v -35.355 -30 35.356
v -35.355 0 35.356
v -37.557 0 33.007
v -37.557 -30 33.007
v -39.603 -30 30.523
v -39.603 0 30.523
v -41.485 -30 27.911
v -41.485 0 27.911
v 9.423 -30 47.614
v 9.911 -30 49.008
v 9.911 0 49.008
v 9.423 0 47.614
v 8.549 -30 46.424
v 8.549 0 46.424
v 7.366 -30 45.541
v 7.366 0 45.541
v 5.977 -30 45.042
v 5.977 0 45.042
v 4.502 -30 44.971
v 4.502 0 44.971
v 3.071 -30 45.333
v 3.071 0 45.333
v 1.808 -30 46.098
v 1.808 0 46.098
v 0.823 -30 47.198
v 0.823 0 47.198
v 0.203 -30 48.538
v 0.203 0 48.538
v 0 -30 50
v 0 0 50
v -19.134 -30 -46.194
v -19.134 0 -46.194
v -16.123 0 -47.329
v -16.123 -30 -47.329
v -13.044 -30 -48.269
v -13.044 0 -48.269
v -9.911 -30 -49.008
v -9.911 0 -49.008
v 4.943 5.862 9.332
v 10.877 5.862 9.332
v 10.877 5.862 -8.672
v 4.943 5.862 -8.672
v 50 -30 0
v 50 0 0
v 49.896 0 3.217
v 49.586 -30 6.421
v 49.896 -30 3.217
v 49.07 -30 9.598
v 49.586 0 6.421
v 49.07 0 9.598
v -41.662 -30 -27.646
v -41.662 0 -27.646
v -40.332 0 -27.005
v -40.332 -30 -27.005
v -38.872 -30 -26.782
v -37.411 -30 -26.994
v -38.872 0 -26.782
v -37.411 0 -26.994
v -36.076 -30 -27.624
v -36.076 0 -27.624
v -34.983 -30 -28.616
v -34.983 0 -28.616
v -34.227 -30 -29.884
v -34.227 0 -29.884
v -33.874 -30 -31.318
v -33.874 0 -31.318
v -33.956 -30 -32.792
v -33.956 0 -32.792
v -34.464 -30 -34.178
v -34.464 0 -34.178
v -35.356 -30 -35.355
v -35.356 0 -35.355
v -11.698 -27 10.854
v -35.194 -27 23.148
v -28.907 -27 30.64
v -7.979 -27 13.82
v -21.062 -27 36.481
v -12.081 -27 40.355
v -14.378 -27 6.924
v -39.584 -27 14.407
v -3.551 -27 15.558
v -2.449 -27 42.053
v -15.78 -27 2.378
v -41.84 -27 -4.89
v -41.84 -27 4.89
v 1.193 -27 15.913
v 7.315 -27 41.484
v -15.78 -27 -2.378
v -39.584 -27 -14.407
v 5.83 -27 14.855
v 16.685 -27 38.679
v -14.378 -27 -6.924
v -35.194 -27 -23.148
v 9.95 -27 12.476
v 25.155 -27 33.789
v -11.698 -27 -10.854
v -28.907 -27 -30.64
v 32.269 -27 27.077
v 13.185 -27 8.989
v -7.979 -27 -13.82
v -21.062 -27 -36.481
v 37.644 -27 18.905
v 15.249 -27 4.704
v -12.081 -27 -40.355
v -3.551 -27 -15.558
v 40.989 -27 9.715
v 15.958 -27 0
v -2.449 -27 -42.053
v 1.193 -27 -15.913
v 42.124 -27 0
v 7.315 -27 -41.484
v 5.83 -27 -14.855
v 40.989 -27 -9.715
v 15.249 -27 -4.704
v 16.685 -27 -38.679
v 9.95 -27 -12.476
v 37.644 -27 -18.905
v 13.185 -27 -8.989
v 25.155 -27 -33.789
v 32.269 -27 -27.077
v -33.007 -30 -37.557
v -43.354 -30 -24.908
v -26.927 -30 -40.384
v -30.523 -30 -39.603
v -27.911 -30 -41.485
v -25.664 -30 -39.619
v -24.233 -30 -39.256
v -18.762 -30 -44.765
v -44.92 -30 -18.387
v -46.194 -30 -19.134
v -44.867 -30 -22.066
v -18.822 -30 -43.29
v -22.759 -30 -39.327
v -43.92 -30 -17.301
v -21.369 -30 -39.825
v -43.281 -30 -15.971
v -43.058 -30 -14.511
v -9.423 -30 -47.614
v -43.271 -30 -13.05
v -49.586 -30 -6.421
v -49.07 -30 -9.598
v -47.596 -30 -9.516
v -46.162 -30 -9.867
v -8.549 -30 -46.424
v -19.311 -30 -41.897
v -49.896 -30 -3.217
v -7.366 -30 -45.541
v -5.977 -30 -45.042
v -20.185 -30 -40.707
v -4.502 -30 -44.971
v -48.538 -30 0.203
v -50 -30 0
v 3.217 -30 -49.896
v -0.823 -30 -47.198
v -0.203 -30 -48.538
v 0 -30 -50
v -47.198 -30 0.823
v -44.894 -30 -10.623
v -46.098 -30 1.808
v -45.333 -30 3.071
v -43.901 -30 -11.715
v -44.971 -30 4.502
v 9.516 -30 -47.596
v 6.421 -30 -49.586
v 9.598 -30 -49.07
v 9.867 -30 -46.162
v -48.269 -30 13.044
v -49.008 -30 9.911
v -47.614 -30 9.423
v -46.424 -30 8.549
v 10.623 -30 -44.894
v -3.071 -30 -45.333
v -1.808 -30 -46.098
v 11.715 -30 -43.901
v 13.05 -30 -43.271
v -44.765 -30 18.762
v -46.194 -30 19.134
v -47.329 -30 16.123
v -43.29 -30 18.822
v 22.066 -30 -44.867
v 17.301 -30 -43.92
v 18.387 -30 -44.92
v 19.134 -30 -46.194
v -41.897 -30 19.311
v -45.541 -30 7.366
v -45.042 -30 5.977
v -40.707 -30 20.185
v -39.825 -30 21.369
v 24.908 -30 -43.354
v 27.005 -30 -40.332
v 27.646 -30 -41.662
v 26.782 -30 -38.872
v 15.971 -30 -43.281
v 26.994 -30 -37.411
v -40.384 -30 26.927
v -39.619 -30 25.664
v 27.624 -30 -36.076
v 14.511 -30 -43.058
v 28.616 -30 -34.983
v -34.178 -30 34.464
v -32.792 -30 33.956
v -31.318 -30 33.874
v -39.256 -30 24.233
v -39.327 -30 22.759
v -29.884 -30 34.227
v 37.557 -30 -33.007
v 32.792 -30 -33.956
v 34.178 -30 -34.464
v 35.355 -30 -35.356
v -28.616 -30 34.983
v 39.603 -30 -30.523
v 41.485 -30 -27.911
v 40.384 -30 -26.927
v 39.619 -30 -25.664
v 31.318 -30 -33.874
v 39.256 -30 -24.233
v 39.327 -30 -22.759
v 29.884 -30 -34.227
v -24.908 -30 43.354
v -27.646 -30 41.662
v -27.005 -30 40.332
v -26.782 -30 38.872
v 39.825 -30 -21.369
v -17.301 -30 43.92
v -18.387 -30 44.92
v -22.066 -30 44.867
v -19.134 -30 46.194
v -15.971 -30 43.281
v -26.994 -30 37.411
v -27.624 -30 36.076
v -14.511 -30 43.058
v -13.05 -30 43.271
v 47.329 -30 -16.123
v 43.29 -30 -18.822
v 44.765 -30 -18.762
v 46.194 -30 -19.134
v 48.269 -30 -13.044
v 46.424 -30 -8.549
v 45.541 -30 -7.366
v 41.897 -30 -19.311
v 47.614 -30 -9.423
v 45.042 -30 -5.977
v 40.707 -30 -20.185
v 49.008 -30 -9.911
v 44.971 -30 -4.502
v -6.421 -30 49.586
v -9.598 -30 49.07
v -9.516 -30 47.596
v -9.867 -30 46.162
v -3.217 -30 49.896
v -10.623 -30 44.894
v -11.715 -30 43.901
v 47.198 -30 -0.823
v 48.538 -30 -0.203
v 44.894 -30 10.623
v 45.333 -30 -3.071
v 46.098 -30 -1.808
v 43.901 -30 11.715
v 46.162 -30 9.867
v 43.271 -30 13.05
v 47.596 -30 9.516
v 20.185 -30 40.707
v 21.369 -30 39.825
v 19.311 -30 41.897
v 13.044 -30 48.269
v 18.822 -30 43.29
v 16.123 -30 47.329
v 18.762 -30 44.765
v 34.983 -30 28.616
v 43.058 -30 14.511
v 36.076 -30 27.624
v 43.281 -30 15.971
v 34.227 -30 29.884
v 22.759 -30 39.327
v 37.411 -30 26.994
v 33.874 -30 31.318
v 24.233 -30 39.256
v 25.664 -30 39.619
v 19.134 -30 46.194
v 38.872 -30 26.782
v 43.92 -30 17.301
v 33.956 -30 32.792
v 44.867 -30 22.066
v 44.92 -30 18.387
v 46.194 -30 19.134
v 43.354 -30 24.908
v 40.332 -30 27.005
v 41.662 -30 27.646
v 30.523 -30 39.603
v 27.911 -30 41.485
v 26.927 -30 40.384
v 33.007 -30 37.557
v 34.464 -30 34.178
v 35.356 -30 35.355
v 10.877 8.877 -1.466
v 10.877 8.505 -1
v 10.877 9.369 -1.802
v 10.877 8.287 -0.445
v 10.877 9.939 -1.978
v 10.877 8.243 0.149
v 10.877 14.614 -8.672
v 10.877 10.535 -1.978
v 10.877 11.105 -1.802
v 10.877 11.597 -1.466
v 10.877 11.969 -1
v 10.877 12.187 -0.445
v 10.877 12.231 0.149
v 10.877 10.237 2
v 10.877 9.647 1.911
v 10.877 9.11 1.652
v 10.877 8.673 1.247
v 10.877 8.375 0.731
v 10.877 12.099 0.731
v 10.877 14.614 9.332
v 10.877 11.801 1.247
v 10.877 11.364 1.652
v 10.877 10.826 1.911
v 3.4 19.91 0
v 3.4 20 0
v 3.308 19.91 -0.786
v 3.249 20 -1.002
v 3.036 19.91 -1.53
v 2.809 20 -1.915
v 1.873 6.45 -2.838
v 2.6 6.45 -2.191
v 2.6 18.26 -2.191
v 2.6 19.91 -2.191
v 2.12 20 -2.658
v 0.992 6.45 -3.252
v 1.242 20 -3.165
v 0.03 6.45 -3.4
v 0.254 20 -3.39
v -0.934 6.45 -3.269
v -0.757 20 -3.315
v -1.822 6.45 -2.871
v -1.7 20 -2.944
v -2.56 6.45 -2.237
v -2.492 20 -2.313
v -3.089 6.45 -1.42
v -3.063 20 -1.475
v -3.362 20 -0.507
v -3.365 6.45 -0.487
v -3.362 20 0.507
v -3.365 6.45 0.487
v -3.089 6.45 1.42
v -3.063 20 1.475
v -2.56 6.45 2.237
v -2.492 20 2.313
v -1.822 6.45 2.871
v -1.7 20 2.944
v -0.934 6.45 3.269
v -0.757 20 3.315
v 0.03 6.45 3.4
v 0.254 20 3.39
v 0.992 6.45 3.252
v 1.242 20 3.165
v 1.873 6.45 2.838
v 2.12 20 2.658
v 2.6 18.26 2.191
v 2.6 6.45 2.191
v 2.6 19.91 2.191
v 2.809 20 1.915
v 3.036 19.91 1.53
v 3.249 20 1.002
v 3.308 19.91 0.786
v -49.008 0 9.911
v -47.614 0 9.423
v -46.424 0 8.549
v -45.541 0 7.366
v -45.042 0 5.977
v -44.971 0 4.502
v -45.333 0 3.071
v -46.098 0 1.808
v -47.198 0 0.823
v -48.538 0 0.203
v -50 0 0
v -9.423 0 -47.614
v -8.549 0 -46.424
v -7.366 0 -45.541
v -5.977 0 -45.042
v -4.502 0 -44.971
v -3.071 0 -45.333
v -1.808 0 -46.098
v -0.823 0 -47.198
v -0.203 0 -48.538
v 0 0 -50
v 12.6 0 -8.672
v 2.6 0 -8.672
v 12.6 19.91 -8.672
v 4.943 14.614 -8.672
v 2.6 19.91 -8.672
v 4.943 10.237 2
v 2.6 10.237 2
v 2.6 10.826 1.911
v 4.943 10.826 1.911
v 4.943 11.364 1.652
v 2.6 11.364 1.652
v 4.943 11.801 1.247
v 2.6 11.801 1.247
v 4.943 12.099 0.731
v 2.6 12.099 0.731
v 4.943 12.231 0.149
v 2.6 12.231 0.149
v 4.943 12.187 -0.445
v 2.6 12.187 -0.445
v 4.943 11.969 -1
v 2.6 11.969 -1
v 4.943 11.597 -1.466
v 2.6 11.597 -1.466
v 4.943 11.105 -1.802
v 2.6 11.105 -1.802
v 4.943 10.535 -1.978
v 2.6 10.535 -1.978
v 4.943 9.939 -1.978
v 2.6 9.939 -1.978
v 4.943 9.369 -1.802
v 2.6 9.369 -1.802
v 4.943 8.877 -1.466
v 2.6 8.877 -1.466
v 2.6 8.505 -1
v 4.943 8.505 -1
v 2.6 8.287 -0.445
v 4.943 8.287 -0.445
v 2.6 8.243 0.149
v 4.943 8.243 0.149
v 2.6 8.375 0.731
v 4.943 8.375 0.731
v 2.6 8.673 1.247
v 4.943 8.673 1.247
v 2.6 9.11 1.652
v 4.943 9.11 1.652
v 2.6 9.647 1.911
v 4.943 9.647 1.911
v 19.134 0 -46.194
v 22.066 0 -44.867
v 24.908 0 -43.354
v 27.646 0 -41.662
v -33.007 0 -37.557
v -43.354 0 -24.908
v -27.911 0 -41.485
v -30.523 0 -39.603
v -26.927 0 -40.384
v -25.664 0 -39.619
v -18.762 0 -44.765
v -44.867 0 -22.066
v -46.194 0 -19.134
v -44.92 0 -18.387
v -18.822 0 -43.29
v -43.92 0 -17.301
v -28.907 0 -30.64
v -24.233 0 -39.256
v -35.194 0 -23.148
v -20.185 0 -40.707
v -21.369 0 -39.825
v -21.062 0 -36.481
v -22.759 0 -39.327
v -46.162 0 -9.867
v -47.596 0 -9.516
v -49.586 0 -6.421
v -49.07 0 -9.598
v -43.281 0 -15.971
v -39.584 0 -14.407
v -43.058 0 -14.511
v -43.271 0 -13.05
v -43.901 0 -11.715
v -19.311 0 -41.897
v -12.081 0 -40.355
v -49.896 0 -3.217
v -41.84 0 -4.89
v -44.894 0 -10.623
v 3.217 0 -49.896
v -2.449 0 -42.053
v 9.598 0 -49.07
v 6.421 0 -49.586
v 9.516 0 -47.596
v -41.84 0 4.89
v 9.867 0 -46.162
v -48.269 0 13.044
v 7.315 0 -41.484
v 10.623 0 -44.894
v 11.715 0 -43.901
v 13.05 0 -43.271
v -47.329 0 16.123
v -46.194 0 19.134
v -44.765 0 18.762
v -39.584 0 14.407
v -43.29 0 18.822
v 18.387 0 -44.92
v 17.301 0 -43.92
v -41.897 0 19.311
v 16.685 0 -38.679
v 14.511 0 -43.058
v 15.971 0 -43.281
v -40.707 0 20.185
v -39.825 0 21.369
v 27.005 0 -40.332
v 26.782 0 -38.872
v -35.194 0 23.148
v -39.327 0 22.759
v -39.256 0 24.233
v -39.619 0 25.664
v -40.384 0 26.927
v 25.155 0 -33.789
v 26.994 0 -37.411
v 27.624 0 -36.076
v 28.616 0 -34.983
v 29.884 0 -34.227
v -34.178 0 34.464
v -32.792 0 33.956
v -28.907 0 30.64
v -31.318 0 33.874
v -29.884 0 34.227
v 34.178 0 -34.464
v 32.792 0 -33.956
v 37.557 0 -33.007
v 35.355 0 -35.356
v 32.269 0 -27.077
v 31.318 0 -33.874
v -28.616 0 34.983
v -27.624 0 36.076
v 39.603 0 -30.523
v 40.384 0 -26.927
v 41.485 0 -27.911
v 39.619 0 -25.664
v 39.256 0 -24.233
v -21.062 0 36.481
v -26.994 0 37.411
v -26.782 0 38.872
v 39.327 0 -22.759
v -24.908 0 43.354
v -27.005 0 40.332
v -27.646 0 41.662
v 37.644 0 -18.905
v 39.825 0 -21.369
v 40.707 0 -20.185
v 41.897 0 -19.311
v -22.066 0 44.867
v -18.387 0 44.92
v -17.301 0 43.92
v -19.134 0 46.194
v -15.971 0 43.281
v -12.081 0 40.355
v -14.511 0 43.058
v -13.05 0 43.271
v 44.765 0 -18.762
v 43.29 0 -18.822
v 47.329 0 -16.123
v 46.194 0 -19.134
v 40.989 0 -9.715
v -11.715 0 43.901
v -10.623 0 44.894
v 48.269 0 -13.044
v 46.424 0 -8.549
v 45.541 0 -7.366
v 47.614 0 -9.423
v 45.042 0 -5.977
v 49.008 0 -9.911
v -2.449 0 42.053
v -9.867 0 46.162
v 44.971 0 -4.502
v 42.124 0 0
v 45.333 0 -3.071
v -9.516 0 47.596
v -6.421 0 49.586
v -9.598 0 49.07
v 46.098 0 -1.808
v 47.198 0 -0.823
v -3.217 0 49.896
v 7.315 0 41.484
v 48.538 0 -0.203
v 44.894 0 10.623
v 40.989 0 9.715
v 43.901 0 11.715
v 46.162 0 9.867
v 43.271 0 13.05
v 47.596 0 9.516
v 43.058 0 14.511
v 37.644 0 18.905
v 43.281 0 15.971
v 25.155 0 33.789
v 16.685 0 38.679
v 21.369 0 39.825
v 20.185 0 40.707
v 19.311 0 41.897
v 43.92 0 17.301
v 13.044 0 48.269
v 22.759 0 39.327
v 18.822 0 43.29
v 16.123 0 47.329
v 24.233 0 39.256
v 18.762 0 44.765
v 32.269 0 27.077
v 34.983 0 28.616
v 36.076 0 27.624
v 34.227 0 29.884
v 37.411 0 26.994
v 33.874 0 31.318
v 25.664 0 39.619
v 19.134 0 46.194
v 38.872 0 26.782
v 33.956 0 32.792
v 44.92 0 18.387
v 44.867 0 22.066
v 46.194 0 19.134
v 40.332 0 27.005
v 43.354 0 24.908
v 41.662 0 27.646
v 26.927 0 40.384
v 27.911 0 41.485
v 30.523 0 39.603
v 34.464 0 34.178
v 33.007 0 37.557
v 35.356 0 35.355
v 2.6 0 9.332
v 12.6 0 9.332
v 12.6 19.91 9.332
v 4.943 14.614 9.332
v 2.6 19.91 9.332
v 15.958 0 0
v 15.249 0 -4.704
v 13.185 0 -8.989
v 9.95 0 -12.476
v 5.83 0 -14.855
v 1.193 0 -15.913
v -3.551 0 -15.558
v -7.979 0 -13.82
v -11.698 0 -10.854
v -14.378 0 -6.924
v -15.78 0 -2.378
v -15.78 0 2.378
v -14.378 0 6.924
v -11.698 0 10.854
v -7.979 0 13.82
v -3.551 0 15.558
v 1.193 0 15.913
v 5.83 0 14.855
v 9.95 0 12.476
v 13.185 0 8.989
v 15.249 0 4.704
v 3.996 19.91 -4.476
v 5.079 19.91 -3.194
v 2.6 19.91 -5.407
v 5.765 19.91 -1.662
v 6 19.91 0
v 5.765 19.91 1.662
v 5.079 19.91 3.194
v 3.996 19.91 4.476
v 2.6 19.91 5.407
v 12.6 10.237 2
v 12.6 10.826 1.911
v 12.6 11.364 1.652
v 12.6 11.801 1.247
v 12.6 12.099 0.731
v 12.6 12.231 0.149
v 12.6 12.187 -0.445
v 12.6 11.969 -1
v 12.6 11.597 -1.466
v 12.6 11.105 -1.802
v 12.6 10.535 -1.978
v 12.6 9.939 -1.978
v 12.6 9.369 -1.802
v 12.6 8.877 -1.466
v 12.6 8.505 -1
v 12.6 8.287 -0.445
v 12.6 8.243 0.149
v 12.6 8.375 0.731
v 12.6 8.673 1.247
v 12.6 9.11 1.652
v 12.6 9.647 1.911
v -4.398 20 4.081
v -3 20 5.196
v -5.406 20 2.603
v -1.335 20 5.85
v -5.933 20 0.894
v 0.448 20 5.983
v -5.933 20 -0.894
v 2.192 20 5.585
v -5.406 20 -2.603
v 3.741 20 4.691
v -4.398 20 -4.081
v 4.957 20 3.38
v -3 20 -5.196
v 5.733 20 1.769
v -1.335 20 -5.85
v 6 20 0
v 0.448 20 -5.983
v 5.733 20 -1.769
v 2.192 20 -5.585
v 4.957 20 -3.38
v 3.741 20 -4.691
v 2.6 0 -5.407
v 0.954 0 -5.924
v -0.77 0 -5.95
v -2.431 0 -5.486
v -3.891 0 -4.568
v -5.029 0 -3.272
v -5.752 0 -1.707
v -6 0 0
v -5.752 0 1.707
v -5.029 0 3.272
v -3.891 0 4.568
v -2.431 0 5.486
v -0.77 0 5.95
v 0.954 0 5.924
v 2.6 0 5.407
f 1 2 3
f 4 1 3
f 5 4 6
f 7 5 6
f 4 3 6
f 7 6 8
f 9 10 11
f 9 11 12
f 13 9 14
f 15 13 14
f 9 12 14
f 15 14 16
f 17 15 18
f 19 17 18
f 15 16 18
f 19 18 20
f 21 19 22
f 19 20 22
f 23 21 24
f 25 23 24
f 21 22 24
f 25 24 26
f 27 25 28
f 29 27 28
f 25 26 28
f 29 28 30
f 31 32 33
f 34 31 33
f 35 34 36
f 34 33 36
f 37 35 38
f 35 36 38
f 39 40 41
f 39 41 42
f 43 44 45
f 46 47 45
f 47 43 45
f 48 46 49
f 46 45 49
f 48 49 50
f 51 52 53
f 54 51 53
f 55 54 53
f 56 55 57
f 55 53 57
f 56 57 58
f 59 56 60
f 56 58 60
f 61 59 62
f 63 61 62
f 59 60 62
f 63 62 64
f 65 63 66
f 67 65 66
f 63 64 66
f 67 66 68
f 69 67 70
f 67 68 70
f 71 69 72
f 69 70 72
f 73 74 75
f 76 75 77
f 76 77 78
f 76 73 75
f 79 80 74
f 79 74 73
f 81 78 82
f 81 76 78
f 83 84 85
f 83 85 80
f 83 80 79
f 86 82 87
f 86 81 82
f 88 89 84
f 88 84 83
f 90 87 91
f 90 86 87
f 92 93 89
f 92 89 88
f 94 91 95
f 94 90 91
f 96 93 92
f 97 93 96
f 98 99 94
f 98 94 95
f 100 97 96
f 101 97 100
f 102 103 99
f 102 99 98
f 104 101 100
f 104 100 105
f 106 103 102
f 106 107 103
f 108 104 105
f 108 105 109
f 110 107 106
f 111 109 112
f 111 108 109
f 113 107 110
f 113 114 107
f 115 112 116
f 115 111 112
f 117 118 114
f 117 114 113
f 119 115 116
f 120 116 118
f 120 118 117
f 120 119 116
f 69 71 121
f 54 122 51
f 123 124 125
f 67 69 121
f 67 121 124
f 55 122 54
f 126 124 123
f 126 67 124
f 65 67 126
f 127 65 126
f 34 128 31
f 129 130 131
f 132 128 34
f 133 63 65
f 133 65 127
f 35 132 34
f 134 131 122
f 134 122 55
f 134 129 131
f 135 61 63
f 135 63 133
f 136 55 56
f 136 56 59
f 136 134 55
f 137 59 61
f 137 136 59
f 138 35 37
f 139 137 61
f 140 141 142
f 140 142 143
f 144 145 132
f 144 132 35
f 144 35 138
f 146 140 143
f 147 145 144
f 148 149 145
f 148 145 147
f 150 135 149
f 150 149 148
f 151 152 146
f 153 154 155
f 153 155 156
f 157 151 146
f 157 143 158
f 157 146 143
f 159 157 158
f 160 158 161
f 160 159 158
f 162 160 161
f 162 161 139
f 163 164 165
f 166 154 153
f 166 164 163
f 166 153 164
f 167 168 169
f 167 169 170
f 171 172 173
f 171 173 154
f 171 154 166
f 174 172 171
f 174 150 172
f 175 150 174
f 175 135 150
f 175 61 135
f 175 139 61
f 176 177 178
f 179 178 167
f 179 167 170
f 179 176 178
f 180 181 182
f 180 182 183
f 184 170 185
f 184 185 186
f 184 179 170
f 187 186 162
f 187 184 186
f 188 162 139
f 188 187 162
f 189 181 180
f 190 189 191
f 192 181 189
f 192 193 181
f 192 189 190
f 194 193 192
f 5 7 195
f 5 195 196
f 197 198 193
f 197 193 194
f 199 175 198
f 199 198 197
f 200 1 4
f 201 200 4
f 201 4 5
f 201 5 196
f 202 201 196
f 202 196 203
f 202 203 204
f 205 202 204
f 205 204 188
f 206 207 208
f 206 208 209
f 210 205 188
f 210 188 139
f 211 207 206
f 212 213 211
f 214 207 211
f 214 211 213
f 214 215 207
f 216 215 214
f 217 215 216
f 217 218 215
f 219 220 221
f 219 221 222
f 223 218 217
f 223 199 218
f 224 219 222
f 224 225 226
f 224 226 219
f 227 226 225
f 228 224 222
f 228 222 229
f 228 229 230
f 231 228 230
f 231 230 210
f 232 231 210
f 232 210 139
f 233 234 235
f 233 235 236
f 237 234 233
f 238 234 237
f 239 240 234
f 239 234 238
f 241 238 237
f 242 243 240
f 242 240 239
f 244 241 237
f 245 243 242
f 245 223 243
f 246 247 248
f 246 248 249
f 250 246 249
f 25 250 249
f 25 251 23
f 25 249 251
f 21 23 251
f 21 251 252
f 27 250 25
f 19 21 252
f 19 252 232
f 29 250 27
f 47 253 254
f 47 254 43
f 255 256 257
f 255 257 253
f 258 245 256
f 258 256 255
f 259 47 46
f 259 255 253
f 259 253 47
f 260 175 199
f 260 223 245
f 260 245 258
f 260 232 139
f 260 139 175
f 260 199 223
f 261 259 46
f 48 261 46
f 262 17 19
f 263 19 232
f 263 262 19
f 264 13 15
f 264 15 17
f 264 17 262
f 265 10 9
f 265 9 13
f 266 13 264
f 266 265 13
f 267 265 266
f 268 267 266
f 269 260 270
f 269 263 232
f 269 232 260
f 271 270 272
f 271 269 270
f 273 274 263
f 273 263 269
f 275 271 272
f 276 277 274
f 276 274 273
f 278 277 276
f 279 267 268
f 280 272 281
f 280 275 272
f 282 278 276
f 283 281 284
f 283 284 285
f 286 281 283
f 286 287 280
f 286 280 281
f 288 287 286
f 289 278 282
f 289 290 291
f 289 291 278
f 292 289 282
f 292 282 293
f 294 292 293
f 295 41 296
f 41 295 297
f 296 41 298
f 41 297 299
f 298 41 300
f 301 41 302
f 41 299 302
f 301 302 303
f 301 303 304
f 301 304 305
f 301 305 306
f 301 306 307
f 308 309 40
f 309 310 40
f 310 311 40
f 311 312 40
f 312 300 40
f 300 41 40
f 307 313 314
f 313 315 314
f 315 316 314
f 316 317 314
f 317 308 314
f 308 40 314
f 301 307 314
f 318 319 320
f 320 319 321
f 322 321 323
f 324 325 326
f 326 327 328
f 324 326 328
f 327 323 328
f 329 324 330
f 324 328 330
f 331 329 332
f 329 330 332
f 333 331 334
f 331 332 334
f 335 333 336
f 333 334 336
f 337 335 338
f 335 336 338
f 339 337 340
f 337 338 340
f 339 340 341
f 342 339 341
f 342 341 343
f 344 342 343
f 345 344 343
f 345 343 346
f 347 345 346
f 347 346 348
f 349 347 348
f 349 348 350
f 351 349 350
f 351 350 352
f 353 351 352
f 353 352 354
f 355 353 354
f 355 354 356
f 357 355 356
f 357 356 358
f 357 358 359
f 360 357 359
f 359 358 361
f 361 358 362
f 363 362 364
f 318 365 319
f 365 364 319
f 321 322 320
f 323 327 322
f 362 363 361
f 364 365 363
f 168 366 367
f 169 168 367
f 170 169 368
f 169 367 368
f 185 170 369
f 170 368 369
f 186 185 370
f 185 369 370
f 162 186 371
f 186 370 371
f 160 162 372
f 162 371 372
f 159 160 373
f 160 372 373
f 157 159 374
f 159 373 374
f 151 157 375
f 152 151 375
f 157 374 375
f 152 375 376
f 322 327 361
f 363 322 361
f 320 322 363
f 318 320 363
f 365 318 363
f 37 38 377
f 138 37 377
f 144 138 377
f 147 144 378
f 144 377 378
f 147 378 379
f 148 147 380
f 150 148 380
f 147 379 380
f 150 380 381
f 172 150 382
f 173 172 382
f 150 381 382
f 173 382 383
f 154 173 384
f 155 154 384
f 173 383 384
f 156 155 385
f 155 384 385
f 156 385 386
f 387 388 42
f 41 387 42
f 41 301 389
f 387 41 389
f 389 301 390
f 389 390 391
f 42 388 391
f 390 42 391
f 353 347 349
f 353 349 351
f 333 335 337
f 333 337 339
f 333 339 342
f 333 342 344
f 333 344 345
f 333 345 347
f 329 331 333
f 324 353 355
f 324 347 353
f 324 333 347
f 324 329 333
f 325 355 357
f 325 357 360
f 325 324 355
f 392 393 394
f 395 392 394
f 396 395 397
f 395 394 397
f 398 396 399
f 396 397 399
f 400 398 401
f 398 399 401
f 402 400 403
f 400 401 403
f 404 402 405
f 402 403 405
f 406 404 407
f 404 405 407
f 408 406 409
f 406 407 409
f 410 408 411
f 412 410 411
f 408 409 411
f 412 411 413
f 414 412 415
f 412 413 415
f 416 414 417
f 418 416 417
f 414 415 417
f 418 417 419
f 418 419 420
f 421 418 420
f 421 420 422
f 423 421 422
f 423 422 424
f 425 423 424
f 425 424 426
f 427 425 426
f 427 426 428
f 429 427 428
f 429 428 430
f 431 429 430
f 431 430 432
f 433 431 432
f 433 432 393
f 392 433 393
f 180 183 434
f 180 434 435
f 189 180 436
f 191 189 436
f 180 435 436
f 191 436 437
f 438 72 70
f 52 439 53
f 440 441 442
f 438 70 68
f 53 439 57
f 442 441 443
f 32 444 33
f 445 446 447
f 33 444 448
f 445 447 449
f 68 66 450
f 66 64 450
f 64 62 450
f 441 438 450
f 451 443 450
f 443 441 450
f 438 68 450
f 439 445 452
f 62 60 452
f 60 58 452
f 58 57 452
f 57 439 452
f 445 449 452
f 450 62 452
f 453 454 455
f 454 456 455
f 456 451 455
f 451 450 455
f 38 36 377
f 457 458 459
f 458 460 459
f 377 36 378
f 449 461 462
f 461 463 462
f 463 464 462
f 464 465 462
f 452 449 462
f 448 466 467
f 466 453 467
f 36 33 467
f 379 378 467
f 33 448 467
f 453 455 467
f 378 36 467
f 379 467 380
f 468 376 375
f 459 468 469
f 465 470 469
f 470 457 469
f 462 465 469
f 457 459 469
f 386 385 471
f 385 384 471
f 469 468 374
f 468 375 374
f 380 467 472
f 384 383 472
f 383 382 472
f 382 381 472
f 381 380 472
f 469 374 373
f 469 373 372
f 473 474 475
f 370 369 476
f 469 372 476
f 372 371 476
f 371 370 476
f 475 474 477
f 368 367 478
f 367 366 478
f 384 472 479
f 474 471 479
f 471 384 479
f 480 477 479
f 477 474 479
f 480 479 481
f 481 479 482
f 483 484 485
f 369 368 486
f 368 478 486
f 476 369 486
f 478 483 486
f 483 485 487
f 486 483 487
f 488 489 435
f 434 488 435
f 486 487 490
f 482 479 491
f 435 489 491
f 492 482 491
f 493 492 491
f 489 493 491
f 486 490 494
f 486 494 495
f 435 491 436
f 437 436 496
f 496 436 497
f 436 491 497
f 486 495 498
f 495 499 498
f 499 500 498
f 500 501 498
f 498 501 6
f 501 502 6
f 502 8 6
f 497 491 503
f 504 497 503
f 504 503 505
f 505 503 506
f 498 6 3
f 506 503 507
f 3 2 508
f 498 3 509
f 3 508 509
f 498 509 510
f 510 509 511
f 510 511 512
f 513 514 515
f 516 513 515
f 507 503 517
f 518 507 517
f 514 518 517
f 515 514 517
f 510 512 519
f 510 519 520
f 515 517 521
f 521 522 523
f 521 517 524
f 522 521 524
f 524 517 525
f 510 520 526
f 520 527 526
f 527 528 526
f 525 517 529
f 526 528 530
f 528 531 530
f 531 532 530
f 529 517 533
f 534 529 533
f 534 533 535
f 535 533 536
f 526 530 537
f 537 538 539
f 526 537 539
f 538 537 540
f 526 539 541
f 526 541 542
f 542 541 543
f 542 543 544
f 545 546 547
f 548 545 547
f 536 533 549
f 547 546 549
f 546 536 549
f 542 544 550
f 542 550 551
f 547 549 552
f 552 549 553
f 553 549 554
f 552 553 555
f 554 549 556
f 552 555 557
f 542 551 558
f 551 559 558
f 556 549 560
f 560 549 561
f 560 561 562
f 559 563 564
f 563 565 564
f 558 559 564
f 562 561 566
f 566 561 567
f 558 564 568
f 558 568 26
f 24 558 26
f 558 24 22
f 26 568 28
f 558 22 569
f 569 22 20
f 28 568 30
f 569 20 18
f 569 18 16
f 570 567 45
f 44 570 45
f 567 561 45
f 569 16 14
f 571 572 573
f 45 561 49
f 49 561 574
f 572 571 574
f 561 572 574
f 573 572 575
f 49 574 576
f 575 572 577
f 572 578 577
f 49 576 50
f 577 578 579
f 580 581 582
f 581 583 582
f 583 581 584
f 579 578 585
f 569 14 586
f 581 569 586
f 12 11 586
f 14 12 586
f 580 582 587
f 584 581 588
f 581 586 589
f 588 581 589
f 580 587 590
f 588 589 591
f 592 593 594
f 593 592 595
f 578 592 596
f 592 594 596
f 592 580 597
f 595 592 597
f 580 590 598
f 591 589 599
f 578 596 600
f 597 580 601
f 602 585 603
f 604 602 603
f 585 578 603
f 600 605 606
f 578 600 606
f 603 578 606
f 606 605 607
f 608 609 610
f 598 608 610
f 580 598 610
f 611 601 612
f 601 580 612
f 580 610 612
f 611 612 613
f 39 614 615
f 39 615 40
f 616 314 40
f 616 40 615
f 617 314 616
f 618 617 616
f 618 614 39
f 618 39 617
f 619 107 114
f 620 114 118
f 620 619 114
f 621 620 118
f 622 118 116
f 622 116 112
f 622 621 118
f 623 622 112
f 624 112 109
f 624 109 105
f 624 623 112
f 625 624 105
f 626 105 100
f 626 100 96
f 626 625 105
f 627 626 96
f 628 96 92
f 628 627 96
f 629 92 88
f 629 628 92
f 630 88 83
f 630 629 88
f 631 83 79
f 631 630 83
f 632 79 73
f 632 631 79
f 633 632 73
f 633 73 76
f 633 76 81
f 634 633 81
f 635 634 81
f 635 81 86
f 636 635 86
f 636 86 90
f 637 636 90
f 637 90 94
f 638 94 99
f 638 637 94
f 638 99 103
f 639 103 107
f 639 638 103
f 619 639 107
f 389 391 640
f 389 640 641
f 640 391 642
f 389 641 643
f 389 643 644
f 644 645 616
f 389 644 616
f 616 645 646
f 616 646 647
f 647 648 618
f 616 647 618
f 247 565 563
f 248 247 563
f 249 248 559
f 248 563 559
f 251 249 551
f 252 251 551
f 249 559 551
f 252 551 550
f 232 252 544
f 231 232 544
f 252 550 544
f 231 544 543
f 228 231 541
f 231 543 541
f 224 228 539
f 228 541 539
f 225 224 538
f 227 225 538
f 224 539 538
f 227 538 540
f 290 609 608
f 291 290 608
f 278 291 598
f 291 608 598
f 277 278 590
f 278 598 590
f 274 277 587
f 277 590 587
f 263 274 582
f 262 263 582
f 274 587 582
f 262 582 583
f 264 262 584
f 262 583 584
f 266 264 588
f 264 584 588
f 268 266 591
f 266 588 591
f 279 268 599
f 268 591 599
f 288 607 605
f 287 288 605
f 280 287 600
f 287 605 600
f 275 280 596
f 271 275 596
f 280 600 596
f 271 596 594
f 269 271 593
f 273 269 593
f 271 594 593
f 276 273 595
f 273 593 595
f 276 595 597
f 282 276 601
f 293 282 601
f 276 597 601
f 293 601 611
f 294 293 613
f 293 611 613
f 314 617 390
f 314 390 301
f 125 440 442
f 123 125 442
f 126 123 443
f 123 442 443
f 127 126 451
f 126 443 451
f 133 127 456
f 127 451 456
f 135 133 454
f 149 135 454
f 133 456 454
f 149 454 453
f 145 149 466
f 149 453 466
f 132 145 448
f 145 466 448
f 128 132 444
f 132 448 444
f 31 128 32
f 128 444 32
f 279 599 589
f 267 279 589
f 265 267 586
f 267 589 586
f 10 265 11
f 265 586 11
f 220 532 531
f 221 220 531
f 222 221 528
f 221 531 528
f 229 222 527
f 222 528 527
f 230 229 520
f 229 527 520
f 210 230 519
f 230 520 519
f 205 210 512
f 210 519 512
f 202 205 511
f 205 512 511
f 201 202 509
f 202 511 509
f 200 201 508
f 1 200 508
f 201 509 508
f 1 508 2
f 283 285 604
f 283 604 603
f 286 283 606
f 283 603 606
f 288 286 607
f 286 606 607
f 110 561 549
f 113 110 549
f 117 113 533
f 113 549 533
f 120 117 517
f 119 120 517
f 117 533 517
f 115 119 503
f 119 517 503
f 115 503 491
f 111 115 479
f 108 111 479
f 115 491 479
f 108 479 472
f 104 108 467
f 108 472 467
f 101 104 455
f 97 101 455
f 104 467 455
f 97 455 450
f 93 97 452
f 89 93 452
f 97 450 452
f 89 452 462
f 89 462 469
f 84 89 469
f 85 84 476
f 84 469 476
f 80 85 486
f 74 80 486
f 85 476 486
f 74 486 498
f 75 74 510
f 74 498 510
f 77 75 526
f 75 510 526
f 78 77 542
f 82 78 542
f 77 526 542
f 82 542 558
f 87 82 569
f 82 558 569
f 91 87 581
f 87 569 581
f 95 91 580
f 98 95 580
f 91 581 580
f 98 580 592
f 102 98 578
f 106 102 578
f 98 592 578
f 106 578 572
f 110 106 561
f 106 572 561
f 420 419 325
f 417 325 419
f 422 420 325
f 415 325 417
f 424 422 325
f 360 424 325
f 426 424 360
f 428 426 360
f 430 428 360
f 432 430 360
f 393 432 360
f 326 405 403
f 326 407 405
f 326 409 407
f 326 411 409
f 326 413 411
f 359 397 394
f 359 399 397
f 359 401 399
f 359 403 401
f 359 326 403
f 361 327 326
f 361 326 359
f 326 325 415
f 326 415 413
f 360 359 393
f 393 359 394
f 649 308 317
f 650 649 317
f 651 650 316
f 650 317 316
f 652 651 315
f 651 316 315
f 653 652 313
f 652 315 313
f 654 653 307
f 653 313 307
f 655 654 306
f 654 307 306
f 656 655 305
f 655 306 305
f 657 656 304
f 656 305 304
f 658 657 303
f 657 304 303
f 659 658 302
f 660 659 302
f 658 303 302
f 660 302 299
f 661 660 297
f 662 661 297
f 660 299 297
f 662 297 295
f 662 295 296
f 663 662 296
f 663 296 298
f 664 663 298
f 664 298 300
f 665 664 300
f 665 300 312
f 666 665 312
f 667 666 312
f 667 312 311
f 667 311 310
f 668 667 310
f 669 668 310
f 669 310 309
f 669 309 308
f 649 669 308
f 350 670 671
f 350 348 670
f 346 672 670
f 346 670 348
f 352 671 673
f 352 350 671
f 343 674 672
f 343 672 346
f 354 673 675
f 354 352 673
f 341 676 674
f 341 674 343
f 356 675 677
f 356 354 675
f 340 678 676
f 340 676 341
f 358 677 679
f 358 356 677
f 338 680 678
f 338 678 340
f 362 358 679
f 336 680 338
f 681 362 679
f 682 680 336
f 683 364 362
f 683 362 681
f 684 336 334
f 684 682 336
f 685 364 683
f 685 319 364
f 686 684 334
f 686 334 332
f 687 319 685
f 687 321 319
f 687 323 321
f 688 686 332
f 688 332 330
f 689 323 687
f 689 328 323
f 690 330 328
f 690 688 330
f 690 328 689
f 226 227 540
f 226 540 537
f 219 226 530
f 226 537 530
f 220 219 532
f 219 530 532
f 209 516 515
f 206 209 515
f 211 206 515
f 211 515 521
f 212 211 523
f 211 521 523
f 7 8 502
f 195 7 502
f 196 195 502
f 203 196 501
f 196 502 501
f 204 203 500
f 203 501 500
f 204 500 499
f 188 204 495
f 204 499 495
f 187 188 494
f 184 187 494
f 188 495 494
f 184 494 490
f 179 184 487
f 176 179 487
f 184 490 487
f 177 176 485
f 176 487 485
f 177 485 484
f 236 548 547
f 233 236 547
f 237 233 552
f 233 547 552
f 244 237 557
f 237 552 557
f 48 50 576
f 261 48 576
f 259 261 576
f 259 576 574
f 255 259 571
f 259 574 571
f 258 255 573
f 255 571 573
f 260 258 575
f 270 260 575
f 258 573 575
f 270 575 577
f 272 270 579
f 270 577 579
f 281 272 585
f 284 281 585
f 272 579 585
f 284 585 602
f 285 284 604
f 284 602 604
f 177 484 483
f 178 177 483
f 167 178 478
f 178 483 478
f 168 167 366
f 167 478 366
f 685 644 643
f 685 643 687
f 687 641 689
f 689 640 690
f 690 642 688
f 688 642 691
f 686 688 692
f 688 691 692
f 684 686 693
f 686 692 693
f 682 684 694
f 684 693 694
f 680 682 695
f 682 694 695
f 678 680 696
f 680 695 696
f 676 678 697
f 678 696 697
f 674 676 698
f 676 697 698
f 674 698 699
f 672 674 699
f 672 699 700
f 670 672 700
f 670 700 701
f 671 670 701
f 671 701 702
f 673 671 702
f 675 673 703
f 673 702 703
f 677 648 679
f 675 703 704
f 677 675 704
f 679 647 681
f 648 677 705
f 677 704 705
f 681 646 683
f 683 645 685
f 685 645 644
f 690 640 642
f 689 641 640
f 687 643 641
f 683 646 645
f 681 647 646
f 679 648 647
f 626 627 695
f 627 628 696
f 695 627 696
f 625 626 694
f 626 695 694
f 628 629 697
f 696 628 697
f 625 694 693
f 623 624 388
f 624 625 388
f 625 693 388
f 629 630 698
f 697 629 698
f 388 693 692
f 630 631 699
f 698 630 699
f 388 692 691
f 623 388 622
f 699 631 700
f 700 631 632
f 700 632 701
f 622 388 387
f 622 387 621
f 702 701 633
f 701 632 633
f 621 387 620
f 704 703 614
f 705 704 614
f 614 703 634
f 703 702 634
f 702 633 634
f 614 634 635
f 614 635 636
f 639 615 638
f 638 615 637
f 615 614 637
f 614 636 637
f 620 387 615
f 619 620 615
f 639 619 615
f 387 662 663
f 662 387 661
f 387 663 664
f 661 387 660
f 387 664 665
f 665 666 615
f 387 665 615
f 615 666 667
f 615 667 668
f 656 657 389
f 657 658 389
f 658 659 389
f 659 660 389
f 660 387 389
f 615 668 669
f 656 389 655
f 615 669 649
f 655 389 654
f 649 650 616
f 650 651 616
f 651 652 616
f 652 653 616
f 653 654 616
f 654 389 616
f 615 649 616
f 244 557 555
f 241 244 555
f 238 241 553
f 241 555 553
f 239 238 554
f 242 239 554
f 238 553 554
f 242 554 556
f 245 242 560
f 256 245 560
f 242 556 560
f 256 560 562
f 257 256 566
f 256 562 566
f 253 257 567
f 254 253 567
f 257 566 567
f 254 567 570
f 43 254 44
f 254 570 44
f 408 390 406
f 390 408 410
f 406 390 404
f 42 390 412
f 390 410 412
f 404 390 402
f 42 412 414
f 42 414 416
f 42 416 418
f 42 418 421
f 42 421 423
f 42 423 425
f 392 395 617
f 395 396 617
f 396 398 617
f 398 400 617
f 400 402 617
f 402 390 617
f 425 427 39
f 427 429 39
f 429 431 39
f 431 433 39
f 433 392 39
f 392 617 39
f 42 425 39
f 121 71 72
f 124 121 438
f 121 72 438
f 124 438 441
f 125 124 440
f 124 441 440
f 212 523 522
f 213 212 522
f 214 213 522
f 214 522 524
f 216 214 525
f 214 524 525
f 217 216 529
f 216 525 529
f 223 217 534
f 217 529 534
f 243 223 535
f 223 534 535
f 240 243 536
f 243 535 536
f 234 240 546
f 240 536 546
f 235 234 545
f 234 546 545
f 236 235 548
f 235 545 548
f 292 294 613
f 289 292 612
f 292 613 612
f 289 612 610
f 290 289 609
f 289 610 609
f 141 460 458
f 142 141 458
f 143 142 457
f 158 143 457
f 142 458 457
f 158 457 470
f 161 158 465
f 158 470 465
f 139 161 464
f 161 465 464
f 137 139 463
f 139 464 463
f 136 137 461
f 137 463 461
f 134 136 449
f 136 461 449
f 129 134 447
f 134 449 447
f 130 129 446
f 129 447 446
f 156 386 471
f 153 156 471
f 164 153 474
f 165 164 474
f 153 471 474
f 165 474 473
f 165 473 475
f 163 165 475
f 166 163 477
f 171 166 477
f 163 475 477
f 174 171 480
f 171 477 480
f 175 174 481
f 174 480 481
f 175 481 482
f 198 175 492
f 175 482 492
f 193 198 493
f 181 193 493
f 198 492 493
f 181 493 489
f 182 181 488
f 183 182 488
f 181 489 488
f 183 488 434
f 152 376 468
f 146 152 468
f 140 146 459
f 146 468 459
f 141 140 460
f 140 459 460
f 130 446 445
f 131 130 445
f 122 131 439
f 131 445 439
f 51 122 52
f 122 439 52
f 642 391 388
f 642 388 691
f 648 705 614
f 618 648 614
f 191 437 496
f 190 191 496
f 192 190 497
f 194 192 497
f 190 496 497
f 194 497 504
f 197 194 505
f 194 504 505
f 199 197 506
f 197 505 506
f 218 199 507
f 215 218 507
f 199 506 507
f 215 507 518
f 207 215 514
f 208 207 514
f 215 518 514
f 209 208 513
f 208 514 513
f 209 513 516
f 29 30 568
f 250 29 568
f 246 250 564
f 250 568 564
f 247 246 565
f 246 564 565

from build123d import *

# Parameters (mm, degrees)
SKETCH1_R               = 6
BOSS_EXTRUDE1_DEPTH     = 20
SKETCH2_R               = 3.4
CUT_EXTRUDE1_DEPTH      = 13.55
SKETCH5_W               = 1.550685087
SKETCH5_H               = 7.184215806
BOSS_EXTRUDE2_DEPTH     = 13.55
SKETCH7_W               = 18.003976239
SKETCH7_H               = 19.909960041
BOSS_EXTRUDE3_DEPTH     = 10
SKETCH6_R               = 2
CUT_EXTRUDE2_DEPTH      = 1
CUT_EXTRUDE2_DEPTH_BACK = 13.55
CUT_EXTRUDE3_DEPTH      = 10
CUT_EXTRUDE3_DEPTH_BACK = 10
SKETCH10_R              = 50
BOSS_EXTRUDE4_DEPTH     = 30
SKETCH11_R              = 5
CUT_EXTRUDE4_DEPTH      = 30
SKETCH12_R              = 42.124366513
SKETCH12_R_2            = 15.95790089
CUT_EXTRUDE5_DEPTH      = 27


with BuildPart() as part:
    # Sketch1 → Boss-Extrude1 (new body)
    with BuildSketch(Plane(origin=(0, 0, 0), x_dir=(1, 0, 0), z_dir=(0, 1, 0))):
        Circle(SKETCH1_R)
    extrude(amount=BOSS_EXTRUDE1_DEPTH)

    # Sketch2 → Cut-Extrude1 (cut)
    with BuildSketch(Plane(origin=(0, 20, 0), x_dir=(1, 0, 0), z_dir=(0, 1, 0))):
        Circle(SKETCH2_R)
    extrude(amount=-CUT_EXTRUDE1_DEPTH, mode=Mode.SUBTRACT)

    # Sketch5 → Boss-Extrude2 (add)
    with BuildSketch(Plane(origin=(0, 18.26, 0), x_dir=(1, 0, 0), z_dir=(0, 1, 0))):
        with Locations((3.375342544, 0.020519704)):
            Rectangle(SKETCH5_W, SKETCH5_H)
    extrude(amount=-BOSS_EXTRUDE2_DEPTH)

    # Sketch7 → Boss-Extrude3 (add)
    with BuildSketch(Plane.ZY.offset(-2.6)):
        with Locations((0.33027221, 9.954980021)):
            Rectangle(SKETCH7_W, SKETCH7_H)
    extrude(amount=-BOSS_EXTRUDE3_DEPTH)

    # Sketch6 → Cut-Extrude2 (cut, two sides)
    with BuildSketch(Plane.ZY.offset(-2.6)) as cut_extrude2_sk:
        with Locations((0, 10.236925537)):
            Circle(SKETCH6_R)
    extrude(amount=CUT_EXTRUDE2_DEPTH, mode=Mode.SUBTRACT)
    extrude(cut_extrude2_sk.sketch, amount=-CUT_EXTRUDE2_DEPTH_BACK, mode=Mode.SUBTRACT)

    # Sketch9 → Cut-Extrude3 (cut, two sides)
    with BuildSketch(Plane.XY) as cut_extrude3_sk:
        Polygon((10.876516382, 10.236925537), (10.876516382, 5.861925537), (4.943430227, 5.861925537), (4.943430227, 10.236925537), (4.943430227, 14.614332445), (10.876516382, 14.614332445), align=None)
    extrude(amount=CUT_EXTRUDE3_DEPTH, mode=Mode.SUBTRACT)
    extrude(cut_extrude3_sk.sketch, amount=-CUT_EXTRUDE3_DEPTH_BACK, mode=Mode.SUBTRACT)

    # Sketch10 → Boss-Extrude4 (add)
    with BuildSketch(Plane.XZ):
        Circle(SKETCH10_R)
    extrude(amount=BOSS_EXTRUDE4_DEPTH)

    # Sketch11 → Cut-Extrude4 (cut)
    with BuildSketch(Plane(origin=(0, 0, 0), x_dir=(1, 0, 0), z_dir=(0, 1, 0))):
        with Locations((5, -49.946157791)):
            Circle(SKETCH11_R)
        with Locations((-14.494169434, -48.057650072)):
            Circle(SKETCH11_R)
        with Locations((-31.781732962, -38.852800774)):
            Circle(SKETCH11_R)
        with Locations((-44.230815749, -23.732964759)):
            Circle(SKETCH11_R)
        with Locations((-49.946157791, -5)):
            Circle(SKETCH11_R)
        with Locations((-48.057650072, 14.494169434)):
            Circle(SKETCH11_R)
        with Locations((-38.852800774, 31.781732962)):
            Circle(SKETCH11_R)
        with Locations((-23.732964759, 44.230815749)):
            Circle(SKETCH11_R)
        with Locations((-5, 49.946157791)):
            Circle(SKETCH11_R)
        with Locations((14.494169434, 48.057650072)):
            Circle(SKETCH11_R)
        with Locations((31.781732962, 38.852800774)):
            Circle(SKETCH11_R)
        with Locations((44.230815749, 23.732964759)):
            Circle(SKETCH11_R)
        with Locations((49.946157791, 5)):
            Circle(SKETCH11_R)
        with Locations((48.057650072, -14.494169434)):
            Circle(SKETCH11_R)
        with Locations((38.852800774, -31.781732962)):
            Circle(SKETCH11_R)
        with Locations((23.732964759, -44.230815749)):
            Circle(SKETCH11_R)
    extrude(amount=-CUT_EXTRUDE4_DEPTH, mode=Mode.SUBTRACT)

    # Sketch12 → Cut-Extrude5 (cut)
    with BuildSketch(Plane(origin=(0, 0, 0), x_dir=(1, 0, 0), z_dir=(0, 1, 0))):
        Circle(SKETCH12_R)
        Circle(SKETCH12_R_2, mode=Mode.SUBTRACT)
    extrude(amount=-CUT_EXTRUDE5_DEPTH, mode=Mode.SUBTRACT)


solid = part.part
